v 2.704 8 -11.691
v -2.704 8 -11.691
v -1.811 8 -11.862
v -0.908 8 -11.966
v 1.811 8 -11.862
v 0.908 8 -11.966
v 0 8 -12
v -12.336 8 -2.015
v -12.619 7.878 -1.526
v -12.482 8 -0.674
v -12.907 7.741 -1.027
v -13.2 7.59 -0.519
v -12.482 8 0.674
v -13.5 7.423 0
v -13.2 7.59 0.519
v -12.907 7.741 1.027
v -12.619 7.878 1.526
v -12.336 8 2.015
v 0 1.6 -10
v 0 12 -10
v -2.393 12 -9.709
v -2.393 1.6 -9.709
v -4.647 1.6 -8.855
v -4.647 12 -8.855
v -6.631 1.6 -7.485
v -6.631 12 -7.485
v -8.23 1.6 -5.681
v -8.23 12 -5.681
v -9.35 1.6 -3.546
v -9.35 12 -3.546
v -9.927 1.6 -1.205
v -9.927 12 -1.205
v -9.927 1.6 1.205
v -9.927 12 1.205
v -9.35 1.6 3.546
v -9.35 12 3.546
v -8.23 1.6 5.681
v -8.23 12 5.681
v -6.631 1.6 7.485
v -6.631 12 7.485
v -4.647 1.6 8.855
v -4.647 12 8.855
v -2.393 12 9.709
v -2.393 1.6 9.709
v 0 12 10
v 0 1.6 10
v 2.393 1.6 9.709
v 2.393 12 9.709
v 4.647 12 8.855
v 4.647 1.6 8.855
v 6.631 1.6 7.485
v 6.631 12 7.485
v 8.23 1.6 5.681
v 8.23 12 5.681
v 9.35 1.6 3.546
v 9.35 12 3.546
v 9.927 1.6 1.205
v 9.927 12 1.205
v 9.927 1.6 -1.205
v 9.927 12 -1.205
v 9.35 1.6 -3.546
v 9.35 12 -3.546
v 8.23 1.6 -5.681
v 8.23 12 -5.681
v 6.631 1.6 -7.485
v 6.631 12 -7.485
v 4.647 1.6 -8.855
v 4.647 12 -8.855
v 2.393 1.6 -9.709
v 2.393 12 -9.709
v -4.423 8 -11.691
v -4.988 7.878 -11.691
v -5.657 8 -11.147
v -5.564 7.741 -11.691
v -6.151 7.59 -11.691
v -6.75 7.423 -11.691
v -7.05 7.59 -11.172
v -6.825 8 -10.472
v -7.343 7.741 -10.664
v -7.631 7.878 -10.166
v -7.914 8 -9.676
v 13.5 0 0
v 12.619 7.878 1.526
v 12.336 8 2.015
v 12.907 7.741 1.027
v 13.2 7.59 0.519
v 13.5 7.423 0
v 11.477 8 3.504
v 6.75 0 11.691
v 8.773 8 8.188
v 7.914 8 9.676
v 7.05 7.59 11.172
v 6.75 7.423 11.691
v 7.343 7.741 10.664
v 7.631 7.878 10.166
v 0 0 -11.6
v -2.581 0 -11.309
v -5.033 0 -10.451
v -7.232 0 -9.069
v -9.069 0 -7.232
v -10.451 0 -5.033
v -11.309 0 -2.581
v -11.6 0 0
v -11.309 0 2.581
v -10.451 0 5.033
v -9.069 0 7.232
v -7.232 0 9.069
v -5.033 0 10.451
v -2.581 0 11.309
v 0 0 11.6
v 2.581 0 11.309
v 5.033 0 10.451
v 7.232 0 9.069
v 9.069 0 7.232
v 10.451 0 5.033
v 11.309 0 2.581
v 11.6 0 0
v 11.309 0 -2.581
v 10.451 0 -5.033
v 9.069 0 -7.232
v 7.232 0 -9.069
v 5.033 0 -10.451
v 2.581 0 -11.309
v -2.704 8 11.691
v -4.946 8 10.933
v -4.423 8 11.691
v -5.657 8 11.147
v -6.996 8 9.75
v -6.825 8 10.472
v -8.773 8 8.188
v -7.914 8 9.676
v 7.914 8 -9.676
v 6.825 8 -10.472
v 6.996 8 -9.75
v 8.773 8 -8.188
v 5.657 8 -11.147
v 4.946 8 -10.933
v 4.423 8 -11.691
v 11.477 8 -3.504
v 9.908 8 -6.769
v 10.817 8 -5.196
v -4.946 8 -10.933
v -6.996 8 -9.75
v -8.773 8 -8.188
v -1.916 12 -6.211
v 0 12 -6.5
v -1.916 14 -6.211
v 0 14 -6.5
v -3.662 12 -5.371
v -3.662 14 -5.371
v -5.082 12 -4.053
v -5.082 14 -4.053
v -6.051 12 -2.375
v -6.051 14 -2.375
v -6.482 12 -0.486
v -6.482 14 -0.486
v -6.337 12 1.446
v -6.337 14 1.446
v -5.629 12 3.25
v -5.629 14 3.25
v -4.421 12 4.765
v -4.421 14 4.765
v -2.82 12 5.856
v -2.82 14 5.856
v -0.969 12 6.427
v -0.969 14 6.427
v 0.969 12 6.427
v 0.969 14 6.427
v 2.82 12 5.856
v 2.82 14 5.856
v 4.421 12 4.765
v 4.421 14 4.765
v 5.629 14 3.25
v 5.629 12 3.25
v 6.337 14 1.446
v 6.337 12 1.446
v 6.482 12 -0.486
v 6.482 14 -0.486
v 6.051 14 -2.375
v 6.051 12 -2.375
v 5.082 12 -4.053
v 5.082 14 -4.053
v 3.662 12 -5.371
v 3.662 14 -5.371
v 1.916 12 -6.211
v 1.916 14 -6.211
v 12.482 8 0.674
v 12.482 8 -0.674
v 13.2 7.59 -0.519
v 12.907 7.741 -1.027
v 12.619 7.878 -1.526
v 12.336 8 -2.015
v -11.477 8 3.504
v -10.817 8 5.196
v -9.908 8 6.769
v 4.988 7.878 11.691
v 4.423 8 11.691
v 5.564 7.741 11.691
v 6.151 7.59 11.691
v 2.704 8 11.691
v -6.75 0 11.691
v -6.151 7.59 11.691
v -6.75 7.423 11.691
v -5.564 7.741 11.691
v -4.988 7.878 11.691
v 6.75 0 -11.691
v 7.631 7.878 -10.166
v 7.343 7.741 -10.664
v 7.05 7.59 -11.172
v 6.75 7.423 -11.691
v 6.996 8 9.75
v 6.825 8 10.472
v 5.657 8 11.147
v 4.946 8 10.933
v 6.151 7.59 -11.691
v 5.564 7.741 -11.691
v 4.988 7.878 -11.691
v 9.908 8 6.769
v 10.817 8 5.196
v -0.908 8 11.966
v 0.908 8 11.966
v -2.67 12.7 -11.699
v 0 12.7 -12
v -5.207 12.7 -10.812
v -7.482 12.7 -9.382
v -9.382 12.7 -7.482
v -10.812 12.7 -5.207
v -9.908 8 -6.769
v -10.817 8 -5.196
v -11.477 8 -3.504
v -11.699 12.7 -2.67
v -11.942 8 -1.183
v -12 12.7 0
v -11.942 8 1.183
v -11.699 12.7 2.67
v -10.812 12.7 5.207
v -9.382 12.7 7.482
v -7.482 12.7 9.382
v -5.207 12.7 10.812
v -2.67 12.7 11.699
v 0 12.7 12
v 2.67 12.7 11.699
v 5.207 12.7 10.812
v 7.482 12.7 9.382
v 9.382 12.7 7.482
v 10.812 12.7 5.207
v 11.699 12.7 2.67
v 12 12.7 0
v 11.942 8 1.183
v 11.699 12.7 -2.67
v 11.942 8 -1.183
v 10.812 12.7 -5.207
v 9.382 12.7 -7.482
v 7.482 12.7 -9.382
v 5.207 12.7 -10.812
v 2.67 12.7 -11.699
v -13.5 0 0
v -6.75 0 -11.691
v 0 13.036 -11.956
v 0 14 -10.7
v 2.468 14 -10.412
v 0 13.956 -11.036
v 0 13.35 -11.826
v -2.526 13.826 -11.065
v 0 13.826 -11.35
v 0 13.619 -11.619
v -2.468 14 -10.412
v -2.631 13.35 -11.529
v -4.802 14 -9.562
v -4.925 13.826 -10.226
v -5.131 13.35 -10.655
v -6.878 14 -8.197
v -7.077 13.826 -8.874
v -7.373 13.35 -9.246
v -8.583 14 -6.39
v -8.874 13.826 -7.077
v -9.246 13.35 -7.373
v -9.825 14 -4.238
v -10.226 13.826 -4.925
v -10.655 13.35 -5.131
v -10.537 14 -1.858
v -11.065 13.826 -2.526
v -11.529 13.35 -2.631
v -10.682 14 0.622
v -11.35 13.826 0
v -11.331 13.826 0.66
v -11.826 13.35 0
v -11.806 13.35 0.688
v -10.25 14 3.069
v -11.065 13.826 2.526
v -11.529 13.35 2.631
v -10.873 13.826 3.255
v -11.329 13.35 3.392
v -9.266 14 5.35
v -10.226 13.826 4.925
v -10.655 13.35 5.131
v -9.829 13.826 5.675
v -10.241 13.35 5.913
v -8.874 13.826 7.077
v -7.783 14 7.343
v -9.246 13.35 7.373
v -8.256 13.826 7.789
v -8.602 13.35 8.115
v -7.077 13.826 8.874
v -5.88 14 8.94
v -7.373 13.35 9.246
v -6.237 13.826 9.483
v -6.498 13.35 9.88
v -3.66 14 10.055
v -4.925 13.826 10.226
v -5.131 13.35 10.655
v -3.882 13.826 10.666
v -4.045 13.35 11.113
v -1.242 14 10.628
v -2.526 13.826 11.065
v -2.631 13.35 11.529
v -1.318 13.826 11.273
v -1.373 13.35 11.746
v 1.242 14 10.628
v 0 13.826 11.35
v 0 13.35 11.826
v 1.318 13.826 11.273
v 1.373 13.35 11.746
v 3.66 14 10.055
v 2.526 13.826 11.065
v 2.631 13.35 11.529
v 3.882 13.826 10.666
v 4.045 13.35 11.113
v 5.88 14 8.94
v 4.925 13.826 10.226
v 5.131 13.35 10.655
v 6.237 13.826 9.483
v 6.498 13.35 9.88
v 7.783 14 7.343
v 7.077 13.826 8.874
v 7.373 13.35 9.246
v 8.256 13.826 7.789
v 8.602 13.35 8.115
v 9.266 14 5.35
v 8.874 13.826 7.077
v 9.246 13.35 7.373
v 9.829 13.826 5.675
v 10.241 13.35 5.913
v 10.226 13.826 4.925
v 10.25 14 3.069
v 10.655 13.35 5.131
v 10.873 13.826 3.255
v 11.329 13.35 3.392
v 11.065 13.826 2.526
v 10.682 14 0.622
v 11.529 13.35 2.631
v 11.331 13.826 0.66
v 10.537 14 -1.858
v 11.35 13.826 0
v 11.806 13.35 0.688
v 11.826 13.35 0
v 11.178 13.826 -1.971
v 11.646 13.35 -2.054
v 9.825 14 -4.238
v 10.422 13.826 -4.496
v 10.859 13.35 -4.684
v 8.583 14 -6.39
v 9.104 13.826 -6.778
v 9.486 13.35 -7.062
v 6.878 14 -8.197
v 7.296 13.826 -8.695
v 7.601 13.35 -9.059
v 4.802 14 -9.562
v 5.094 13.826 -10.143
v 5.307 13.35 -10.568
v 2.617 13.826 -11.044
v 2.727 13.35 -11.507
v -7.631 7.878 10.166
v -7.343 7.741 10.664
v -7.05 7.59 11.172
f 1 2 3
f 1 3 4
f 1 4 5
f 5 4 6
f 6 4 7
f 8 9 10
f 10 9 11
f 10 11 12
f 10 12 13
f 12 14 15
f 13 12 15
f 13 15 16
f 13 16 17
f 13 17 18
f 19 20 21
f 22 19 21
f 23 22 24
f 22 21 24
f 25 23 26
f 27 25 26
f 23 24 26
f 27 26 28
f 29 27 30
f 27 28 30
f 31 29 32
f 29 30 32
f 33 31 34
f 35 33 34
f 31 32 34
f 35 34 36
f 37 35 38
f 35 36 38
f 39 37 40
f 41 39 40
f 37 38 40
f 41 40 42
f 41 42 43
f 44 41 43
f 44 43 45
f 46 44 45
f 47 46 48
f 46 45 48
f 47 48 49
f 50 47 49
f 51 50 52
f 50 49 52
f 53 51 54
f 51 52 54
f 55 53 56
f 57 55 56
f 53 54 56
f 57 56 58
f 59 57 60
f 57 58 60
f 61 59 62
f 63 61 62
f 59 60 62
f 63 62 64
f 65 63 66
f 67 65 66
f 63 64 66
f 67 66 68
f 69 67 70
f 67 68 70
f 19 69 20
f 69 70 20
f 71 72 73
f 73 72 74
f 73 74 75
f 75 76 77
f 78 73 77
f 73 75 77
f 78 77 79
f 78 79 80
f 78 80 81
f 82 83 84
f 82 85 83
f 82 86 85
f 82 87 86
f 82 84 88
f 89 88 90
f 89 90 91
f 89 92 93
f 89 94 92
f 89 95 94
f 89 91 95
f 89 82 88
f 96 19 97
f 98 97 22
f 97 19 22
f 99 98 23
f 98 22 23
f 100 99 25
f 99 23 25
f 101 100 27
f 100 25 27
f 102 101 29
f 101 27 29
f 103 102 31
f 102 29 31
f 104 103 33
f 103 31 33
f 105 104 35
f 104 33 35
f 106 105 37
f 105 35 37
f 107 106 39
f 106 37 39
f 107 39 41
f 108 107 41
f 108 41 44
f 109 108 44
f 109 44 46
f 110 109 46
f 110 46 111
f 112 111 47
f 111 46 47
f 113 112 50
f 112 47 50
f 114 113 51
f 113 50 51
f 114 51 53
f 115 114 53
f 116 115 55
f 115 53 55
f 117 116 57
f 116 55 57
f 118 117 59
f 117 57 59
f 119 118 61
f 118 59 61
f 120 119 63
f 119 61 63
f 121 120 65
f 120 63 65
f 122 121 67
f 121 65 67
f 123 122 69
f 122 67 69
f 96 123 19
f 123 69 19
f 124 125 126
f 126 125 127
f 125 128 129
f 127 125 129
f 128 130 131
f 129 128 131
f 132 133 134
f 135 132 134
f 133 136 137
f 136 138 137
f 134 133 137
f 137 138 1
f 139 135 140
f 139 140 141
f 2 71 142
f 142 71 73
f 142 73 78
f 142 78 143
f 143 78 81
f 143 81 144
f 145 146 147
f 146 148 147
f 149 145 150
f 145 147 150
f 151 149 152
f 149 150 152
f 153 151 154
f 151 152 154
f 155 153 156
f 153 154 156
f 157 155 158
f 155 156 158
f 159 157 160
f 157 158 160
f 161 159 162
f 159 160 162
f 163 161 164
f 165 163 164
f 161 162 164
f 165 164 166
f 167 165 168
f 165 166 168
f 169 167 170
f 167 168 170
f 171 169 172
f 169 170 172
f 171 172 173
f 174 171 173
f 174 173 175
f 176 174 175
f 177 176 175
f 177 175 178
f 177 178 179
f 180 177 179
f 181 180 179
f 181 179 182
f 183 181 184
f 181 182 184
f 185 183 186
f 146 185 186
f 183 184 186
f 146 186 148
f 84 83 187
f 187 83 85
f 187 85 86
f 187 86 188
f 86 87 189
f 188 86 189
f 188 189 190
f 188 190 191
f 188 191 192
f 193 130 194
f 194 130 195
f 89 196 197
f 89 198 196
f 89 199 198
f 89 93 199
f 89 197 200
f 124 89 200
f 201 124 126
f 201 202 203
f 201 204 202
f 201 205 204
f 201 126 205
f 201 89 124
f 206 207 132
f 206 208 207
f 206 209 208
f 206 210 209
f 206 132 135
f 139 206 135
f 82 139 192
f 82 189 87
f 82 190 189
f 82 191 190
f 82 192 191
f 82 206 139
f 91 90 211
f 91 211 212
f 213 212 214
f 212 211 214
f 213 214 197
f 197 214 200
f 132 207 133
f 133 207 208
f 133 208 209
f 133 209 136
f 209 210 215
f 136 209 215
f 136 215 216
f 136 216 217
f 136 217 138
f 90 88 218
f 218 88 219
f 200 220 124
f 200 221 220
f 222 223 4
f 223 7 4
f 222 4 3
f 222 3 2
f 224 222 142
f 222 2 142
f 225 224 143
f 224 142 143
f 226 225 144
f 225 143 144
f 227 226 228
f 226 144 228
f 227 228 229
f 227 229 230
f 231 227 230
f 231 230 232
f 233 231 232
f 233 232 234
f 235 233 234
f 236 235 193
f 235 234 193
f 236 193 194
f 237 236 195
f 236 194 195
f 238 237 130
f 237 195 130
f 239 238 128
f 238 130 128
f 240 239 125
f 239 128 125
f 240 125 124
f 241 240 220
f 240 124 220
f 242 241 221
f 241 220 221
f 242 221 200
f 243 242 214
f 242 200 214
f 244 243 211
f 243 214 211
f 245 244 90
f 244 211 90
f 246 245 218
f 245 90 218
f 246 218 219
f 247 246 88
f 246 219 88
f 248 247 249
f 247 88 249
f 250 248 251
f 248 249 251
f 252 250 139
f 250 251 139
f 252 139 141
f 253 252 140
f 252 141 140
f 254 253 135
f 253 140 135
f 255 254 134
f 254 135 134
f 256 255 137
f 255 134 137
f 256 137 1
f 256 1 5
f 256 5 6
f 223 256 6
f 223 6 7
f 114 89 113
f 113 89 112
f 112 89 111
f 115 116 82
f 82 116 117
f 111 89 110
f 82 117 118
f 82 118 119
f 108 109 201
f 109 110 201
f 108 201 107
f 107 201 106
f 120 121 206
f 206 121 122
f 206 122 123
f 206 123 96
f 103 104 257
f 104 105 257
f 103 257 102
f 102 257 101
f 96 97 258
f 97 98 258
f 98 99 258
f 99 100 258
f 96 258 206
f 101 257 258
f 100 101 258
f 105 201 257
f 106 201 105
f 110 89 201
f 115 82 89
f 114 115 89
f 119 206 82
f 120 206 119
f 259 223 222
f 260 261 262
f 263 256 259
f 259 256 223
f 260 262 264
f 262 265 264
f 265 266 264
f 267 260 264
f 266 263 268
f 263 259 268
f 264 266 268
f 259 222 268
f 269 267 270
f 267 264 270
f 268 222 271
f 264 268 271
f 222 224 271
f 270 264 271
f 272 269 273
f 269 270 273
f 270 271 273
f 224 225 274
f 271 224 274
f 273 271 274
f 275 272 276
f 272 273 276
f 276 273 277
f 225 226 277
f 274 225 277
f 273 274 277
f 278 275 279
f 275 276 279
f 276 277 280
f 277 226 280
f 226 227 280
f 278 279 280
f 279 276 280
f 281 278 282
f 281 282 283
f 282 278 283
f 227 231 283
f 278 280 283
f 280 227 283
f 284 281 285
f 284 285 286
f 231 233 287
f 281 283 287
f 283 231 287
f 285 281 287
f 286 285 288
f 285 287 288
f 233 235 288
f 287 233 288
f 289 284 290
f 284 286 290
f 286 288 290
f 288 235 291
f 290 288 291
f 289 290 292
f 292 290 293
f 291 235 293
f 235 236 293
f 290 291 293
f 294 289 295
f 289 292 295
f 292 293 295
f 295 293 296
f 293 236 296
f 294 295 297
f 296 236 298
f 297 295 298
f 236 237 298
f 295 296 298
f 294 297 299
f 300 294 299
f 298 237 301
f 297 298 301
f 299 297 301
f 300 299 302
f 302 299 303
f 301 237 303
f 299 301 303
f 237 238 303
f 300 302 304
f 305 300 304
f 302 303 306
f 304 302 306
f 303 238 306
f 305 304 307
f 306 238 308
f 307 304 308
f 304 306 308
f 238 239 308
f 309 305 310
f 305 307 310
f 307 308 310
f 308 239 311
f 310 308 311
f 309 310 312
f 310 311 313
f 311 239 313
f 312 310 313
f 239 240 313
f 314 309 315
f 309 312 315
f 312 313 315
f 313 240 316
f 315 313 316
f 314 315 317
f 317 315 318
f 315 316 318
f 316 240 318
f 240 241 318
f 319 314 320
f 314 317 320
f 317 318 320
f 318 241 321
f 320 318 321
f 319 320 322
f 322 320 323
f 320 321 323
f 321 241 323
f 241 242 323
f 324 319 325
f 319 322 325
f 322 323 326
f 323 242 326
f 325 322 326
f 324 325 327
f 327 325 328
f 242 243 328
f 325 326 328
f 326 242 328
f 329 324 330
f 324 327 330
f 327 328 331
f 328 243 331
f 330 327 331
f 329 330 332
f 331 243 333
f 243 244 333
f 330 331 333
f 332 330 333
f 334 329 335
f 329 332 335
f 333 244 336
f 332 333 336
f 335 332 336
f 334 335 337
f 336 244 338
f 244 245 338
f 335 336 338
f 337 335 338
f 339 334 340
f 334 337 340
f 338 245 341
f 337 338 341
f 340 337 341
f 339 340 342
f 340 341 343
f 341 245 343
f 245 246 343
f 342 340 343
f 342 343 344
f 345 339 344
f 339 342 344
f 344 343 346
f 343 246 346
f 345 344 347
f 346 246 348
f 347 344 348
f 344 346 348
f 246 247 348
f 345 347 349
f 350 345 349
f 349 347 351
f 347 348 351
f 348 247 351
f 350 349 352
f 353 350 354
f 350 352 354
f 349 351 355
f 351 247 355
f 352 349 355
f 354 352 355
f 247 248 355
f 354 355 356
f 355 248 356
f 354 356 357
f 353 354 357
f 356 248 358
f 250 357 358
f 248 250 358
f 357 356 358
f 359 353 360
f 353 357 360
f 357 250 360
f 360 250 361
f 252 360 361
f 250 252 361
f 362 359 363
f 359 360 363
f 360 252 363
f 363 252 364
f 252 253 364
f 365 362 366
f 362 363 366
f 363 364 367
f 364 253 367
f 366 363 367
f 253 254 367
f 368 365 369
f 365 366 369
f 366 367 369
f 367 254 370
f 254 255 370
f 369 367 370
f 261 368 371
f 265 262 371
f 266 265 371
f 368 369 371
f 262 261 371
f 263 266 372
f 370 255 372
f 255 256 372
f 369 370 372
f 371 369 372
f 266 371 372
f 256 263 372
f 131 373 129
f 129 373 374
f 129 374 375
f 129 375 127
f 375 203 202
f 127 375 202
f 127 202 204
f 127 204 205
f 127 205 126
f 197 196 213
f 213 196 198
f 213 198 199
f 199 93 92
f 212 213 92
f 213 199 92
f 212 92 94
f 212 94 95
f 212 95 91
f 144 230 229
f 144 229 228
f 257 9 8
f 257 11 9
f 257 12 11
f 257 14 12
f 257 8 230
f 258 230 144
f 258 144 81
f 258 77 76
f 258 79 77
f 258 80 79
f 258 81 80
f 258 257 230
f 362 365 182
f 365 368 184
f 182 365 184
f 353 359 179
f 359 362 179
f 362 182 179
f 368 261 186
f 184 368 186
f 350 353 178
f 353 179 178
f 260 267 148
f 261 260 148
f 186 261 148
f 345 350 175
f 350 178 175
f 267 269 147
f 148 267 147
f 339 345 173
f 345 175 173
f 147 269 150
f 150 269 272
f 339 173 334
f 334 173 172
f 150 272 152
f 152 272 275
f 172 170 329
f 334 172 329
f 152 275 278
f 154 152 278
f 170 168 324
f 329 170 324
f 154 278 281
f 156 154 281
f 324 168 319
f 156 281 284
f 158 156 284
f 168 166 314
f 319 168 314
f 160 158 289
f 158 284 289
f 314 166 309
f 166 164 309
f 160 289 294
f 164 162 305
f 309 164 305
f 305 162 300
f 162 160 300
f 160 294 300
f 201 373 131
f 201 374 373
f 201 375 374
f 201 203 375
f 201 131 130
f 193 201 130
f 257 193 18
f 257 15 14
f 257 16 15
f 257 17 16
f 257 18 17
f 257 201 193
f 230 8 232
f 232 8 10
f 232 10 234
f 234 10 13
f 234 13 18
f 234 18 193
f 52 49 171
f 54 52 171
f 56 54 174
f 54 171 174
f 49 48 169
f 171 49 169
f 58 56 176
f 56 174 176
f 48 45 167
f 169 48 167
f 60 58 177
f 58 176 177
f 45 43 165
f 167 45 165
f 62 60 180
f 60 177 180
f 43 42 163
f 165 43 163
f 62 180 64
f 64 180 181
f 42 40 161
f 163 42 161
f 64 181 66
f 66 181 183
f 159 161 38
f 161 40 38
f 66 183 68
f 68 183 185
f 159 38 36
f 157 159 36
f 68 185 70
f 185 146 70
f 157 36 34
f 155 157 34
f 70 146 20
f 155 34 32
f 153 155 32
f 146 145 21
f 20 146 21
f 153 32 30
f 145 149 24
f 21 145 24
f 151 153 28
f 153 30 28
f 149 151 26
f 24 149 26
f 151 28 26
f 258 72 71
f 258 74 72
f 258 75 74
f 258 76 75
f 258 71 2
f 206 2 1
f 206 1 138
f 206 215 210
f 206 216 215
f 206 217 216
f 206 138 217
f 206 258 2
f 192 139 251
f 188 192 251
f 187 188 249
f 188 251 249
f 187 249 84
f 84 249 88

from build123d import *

# Parameters (mm, degrees)
FILLET1_R          = 1.3
CHAMFER1_SIZE      = 1
CHAMFER1_SIZE2     = 0.577350269
SKETCH2_OUTSIDE_W  = 37.134
SKETCH2_OUTSIDE_H  = 37.134
CUT_EXTRUDE1_DEPTH = 8
CHAMFER2_SIZE      = 1.6


with BuildPart() as part:
    # Sketch1 → Revolve1 (revolve)
    with BuildSketch(Plane(origin=(0, 0, 0), x_dir=(0, 0, -1), z_dir=(1, 0, 0))):
        Polygon((10, 0), (10, 12), (6.5, 12), (6.5, 14), (12, 14), (12, 8), (13.5, 8), (13.5, 0), align=None)
    revolve(axis=Axis((0, 0, 0), (0, 1, 0)))

    # Fillet1
    fillet1_edges = [part.edges().sort_by_distance(p)[0] for p in [
        (0, 14, 12),
    ]]
    fillet(fillet1_edges, radius=FILLET1_R)

    # Chamfer1
    chamfer1_edges = [part.edges().sort_by_distance(p)[0] for p in [
        (0, 8, 13.5),
    ]]
    chamfer1_side = [part.faces().sort_by_distance(p)[0] for p in [
        (0, 8, 12.381837662),
    ]]
    chamfer(chamfer1_edges, length=CHAMFER1_SIZE, length2=CHAMFER1_SIZE2, reference=chamfer1_side[0])

    # Sketch2 outside → Cut-Extrude1 (cut)
    with BuildSketch(Plane.XZ):
        Rectangle(SKETCH2_OUTSIDE_W, SKETCH2_OUTSIDE_H)
        Polygon((-13.5, 0), (-6.75, -11.691342951), (6.75, -11.691342951), (13.5, 0), (6.75, 11.691342951), (-6.75, 11.691342951), align=None, mode=Mode.SUBTRACT)
    extrude(amount=-CUT_EXTRUDE1_DEPTH, mode=Mode.SUBTRACT)

    # Chamfer2
    chamfer2_edges = [part.edges().sort_by_distance(p)[0] for p in [
        (0, 0, 10),
    ]]
    chamfer(chamfer2_edges, length=CHAMFER2_SIZE)


solid = part.part
